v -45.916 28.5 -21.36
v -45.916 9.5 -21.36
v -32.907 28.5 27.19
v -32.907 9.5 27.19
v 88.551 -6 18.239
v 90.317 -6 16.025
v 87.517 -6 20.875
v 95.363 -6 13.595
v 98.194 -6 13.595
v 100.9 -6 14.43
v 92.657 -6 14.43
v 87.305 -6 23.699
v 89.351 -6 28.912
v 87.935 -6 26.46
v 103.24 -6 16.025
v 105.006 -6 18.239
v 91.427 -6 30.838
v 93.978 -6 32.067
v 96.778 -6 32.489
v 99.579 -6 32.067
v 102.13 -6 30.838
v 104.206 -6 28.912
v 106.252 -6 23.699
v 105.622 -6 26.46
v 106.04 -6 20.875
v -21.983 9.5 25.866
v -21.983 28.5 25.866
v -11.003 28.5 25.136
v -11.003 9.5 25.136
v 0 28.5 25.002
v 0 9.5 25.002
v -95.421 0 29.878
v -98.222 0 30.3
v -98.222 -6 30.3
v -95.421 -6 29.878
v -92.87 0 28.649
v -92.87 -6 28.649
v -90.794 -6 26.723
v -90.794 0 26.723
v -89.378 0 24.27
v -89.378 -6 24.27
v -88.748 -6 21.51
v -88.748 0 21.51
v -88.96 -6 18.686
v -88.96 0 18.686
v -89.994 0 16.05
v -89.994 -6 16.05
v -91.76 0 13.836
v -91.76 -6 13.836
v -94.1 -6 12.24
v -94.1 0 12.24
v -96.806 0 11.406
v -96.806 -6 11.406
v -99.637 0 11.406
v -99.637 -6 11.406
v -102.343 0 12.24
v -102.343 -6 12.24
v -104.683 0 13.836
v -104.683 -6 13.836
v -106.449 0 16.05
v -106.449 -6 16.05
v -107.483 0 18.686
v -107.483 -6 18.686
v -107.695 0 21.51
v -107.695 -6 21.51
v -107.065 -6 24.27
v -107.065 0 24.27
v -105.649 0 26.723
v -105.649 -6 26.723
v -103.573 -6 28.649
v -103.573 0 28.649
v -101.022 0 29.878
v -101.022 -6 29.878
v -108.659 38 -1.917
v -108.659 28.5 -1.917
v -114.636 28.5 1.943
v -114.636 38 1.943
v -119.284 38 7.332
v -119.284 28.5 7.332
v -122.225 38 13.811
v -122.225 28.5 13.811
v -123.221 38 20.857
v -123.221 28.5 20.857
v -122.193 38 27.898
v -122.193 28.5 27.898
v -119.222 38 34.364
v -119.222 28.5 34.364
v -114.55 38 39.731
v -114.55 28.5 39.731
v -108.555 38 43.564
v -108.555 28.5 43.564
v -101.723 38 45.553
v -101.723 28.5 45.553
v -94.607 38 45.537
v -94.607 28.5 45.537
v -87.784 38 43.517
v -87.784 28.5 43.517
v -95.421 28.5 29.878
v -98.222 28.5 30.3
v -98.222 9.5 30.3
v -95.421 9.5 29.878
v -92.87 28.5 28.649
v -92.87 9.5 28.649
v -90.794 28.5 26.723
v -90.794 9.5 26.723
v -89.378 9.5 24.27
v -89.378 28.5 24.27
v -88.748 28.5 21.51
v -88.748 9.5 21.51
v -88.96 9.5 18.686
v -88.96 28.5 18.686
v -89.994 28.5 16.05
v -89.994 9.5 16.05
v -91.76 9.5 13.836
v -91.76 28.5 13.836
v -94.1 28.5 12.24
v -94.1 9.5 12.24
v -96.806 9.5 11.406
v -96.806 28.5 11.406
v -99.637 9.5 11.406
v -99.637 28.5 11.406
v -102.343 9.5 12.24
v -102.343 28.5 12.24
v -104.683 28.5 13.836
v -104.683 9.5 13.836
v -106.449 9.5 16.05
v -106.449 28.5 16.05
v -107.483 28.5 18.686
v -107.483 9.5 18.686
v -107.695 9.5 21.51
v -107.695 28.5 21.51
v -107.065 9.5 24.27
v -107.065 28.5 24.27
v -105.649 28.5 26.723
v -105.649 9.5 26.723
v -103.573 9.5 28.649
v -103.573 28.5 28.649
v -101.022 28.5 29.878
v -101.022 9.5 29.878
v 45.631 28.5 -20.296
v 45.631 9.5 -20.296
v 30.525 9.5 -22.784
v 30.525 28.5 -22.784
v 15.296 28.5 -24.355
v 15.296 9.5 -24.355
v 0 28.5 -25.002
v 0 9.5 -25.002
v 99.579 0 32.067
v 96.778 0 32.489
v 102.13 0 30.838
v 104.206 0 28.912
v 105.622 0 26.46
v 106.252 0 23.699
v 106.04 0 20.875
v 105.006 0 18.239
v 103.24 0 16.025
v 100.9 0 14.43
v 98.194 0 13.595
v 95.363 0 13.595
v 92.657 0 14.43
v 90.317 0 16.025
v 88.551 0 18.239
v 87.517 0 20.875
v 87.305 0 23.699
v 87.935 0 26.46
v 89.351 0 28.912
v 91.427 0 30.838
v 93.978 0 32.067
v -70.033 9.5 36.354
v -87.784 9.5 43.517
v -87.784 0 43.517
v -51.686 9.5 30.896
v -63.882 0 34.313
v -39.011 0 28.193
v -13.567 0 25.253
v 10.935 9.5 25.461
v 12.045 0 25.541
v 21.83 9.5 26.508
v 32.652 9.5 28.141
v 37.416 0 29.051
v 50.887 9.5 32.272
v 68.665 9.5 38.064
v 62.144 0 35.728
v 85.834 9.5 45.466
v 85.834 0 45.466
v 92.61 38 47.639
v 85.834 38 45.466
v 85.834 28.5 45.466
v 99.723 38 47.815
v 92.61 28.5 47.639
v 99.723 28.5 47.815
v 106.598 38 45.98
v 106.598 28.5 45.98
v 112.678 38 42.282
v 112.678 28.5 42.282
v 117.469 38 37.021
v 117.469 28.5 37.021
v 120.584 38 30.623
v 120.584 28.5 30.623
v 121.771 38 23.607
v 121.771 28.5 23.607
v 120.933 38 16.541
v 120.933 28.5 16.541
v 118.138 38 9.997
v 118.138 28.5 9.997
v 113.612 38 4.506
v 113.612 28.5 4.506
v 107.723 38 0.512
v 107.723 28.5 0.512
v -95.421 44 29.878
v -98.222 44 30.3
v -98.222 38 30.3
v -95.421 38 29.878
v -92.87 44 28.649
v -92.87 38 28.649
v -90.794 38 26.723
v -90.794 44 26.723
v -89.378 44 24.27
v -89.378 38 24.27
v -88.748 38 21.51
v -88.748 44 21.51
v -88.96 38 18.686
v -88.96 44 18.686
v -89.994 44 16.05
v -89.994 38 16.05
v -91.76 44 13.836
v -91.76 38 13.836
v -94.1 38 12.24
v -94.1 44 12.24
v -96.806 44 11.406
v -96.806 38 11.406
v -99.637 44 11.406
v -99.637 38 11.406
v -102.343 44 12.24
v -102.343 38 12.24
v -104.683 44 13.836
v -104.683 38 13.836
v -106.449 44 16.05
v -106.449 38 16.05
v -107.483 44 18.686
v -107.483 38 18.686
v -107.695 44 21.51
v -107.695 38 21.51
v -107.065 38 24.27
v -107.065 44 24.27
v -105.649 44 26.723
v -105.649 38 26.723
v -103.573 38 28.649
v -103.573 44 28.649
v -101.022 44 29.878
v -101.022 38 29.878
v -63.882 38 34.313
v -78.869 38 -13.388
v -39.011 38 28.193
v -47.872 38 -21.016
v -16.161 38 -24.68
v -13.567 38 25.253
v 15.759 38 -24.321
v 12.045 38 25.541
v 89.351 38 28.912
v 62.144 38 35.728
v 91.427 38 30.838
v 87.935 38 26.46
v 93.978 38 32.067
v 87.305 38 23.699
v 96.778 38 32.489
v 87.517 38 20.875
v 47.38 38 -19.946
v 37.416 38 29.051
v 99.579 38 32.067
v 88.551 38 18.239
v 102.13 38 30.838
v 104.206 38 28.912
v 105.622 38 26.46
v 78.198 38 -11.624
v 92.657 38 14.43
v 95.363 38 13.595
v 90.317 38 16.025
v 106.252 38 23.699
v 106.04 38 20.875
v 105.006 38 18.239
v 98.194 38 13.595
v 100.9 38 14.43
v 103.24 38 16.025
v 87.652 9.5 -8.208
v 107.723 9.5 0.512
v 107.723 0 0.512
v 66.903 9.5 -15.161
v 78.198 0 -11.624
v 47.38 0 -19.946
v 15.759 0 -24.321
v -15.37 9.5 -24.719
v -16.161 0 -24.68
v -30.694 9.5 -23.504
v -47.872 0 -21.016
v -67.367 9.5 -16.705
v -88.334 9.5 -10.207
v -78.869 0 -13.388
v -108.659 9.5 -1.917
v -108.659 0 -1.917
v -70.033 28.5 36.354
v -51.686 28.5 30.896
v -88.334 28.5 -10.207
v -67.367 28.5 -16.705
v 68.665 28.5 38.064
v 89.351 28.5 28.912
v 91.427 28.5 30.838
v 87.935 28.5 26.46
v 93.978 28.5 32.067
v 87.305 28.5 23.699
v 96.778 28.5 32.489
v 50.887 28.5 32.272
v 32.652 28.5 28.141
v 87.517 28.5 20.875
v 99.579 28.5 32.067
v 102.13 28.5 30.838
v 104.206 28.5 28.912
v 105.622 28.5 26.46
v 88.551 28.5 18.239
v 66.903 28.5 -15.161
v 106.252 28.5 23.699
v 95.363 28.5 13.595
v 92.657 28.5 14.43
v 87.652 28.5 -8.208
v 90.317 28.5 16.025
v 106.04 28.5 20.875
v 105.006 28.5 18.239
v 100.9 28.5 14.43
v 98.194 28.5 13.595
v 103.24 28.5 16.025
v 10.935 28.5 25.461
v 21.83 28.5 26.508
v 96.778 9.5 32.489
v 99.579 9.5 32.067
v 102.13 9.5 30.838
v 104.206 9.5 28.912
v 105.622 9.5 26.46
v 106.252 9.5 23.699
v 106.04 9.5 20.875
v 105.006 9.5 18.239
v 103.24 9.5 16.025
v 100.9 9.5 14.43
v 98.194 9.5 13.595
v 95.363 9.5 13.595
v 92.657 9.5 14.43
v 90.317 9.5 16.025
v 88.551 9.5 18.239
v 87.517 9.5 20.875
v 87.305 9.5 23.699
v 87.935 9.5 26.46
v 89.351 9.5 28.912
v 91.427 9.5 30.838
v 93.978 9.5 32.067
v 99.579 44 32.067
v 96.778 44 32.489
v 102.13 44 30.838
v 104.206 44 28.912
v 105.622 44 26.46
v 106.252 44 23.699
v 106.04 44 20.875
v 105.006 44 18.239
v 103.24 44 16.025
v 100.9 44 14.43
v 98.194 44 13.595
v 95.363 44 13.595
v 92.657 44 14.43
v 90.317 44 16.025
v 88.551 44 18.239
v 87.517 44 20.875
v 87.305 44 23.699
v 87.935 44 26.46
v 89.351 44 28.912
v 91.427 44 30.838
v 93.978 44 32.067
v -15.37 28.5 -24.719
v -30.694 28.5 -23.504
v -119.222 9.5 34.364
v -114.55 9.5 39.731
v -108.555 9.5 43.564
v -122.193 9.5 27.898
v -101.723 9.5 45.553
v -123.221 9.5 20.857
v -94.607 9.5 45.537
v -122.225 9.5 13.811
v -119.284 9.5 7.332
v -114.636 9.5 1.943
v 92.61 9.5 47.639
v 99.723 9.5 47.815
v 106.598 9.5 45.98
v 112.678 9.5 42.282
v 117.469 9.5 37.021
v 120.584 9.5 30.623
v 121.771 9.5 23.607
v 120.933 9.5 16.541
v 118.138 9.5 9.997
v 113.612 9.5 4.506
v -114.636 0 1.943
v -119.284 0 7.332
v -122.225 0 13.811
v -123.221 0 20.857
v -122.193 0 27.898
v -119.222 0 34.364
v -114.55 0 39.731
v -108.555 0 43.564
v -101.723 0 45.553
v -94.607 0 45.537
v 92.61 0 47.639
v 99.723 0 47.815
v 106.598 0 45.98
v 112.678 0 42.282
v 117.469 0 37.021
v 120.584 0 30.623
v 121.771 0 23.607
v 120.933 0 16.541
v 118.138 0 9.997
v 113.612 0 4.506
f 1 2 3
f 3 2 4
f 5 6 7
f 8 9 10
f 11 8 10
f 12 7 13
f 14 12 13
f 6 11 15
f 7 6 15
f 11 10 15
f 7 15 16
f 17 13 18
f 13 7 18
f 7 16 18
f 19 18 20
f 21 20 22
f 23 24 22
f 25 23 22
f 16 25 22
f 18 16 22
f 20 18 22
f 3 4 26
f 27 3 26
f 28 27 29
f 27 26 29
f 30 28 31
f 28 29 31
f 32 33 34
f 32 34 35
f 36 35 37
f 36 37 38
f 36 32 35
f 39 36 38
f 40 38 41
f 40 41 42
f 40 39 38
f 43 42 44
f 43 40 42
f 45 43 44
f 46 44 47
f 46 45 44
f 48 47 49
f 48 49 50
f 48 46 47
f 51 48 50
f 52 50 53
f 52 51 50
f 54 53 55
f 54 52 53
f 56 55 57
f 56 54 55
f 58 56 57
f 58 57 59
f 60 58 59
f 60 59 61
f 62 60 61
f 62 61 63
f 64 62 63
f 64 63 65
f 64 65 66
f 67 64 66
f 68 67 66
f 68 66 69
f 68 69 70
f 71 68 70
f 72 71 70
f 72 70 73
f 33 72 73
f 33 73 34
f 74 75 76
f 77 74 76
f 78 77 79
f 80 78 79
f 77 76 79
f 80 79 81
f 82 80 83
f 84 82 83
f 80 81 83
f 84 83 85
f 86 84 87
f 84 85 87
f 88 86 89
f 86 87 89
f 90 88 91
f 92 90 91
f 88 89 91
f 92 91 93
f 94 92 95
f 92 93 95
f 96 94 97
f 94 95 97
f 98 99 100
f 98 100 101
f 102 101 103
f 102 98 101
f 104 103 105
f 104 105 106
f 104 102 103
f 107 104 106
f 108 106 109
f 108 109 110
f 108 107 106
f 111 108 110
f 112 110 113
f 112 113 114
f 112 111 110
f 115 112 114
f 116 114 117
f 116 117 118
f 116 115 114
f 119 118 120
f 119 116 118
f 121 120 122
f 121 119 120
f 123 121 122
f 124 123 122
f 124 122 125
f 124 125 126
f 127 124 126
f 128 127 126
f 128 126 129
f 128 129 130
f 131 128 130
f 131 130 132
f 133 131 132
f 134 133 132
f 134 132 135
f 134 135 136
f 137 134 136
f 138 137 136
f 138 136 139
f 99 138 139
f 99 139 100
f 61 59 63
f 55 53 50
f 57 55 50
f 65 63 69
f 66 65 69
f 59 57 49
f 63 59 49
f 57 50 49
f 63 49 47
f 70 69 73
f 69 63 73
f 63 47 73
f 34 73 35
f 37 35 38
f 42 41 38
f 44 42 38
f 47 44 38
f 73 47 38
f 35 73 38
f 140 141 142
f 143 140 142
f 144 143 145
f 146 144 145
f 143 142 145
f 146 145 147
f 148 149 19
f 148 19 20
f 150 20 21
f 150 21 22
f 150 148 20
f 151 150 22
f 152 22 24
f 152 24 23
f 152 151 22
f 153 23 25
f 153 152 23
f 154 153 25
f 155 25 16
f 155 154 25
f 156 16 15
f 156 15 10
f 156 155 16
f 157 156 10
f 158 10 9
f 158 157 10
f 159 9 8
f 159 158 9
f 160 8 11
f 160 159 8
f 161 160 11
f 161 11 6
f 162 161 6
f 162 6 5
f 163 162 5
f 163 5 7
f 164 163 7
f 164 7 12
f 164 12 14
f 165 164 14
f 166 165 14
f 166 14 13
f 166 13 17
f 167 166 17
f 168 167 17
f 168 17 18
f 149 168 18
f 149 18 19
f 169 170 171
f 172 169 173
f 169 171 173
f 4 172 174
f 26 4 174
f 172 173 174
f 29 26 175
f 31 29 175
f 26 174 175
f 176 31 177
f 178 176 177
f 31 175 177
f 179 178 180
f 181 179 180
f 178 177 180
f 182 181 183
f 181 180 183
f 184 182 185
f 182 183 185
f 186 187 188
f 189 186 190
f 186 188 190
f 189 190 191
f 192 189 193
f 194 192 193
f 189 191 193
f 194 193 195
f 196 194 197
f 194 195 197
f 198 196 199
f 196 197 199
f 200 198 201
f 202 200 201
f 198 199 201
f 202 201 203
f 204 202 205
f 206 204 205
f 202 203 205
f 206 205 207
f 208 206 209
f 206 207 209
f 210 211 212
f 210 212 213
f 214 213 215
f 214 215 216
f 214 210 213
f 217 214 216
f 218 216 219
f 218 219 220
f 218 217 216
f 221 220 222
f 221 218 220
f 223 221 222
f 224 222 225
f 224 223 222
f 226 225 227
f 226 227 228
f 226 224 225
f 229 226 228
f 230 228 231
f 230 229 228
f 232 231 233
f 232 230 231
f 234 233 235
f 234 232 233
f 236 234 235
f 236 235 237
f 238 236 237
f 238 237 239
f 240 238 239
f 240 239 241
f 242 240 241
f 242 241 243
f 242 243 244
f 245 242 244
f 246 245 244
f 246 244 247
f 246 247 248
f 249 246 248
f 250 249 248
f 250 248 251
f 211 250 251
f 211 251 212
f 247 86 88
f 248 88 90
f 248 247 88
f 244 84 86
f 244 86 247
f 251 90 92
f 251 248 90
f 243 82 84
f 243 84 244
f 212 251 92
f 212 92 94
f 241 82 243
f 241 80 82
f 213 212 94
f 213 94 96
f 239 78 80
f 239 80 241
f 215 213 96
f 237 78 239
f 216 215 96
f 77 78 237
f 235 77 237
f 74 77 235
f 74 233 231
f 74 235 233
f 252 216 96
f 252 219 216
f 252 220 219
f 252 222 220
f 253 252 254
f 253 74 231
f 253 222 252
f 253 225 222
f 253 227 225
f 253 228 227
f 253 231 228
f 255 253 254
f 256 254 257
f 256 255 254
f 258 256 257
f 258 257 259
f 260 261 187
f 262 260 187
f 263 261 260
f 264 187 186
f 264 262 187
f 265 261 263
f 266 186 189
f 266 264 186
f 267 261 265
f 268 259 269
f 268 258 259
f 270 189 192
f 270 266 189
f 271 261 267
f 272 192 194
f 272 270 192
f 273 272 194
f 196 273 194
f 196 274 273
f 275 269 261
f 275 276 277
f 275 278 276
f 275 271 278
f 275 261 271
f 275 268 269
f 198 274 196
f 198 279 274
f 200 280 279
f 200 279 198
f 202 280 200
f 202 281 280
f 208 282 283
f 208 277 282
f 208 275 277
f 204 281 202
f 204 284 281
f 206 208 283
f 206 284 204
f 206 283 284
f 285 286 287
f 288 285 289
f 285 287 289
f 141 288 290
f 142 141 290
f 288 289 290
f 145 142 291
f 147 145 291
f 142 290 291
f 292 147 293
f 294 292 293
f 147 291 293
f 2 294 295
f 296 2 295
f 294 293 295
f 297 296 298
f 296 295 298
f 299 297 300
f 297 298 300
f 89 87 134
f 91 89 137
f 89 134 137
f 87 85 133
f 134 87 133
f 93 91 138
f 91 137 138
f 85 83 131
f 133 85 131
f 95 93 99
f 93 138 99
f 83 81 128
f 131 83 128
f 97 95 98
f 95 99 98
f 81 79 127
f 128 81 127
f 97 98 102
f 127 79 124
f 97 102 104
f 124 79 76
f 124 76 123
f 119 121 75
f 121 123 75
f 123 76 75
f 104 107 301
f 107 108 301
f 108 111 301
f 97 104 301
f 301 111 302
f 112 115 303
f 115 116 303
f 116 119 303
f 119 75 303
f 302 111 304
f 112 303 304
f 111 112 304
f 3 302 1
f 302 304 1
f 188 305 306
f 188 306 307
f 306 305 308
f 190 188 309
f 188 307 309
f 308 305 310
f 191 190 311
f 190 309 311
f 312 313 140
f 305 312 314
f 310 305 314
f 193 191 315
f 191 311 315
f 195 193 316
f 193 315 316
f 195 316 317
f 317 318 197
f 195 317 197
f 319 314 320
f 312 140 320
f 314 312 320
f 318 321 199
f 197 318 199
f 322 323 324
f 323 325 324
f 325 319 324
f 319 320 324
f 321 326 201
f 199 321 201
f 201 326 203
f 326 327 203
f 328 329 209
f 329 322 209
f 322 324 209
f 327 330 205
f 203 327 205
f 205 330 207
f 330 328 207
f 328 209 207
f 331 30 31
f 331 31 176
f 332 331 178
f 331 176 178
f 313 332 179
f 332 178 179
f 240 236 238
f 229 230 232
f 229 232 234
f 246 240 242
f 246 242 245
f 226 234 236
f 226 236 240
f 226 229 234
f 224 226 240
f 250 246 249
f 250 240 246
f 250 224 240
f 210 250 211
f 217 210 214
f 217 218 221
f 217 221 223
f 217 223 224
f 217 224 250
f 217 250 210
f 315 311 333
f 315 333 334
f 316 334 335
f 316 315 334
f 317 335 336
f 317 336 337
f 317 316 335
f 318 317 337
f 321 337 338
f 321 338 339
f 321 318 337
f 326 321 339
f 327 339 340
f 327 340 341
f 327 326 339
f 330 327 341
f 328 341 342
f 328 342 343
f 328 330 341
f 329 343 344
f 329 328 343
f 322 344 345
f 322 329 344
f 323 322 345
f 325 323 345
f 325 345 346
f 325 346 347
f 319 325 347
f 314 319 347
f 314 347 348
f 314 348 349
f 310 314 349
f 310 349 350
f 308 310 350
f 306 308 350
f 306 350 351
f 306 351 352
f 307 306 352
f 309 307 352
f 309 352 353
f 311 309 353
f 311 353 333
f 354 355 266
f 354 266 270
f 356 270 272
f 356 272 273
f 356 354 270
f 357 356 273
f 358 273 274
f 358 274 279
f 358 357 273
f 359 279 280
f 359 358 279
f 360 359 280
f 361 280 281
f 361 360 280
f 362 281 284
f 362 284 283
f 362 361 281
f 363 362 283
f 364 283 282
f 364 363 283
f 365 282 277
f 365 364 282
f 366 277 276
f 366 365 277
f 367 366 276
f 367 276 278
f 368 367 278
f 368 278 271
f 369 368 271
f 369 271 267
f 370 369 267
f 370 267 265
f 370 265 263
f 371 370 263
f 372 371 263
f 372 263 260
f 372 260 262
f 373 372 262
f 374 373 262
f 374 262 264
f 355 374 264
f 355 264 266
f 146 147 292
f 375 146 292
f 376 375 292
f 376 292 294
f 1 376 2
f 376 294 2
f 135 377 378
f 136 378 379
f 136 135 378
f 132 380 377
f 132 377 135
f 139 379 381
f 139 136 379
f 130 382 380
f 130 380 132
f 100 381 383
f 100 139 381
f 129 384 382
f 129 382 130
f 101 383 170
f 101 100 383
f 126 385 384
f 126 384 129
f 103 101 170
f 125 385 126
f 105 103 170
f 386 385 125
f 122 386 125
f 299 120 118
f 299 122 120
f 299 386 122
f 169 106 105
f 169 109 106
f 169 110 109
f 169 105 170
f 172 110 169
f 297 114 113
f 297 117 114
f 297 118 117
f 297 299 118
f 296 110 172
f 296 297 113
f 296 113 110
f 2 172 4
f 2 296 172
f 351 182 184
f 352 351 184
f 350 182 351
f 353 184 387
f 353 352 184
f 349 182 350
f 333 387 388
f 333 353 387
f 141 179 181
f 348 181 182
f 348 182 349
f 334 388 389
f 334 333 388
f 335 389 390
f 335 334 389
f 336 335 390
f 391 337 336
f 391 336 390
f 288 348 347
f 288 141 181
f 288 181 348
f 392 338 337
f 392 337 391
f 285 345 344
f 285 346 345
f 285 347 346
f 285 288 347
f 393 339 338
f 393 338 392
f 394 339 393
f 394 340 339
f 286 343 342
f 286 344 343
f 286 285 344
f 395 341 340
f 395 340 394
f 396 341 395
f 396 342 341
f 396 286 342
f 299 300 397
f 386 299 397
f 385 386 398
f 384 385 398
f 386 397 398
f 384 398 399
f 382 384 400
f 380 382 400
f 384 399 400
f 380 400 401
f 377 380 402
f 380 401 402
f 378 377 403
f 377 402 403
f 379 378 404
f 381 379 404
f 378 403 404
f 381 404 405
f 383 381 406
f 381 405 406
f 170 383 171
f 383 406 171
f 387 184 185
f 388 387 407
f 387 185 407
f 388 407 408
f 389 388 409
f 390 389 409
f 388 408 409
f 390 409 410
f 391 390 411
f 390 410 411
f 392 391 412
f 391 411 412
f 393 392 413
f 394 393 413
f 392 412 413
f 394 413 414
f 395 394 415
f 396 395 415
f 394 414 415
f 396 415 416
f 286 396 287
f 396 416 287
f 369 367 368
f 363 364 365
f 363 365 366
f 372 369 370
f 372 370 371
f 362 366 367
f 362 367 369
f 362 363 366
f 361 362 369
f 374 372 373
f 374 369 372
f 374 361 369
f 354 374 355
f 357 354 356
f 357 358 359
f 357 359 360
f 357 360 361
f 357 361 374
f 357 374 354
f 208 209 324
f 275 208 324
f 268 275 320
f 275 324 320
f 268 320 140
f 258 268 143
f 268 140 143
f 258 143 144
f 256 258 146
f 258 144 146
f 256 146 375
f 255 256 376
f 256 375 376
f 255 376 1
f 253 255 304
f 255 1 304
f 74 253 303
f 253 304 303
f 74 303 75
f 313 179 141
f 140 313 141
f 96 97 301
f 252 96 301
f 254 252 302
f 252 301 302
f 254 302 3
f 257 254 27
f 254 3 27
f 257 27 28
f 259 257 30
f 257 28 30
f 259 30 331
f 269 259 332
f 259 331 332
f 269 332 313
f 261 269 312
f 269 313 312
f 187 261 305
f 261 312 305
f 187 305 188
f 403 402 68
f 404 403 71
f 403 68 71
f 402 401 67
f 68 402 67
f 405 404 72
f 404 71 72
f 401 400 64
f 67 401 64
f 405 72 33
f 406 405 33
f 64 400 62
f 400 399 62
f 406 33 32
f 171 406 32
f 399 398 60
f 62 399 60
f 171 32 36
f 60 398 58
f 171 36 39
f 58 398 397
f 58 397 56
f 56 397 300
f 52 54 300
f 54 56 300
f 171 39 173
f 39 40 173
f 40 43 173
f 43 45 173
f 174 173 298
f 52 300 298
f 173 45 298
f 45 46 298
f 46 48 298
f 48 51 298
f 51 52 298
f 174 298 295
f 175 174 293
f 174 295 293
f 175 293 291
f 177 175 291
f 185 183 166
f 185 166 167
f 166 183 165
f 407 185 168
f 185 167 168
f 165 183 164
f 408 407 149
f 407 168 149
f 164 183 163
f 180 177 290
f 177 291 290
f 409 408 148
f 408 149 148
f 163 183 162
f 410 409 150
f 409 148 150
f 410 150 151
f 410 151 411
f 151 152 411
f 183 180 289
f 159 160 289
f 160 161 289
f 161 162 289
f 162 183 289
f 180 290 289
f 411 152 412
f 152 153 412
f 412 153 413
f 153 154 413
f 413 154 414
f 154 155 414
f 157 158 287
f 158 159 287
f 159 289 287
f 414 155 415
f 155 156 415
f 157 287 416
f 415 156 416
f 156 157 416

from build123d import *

# Parameters (mm, degrees)
BOSS_EXTRUDE1_DEPTH = 9.5
BOSS_EXTRUDE2_DEPTH = 19
BOSS_EXTRUDE3_DEPTH = 9.5
SKETCH4_R           = 9.5
CUT_EXTRUDE1_DEPTH  = 138.588150993
BOSS_EXTRUDE4_START = 6
SKETCH4_2_R         = 9.5
BOSS_EXTRUDE4_DEPTH = 50


with BuildPart() as part:
    # Sketch1 → Boss-Extrude1 (new body)
    with BuildSketch(Plane(origin=(0, 0, 0), x_dir=(1, 0, 0), z_dir=(0, 1, 0))):
        with BuildLine():
            ThreePointArc((107.722957073, -0.512015135), (-0.194984925, 25.004261154), (-108.658621874, 1.917424631))
            ThreePointArc((-108.658621874, 1.917424631), (-120.938659261, -31.236770908), (-87.784463723, -43.516808294))
            ThreePointArc((-87.784463723, -43.516808294), (-0.756328147, -24.992587685), (85.83395733, -45.466121624))
            ThreePointArc((85.83395733, -45.466121624), (119.255510446, -33.933568251), (107.722957073, -0.512015135))
        make_face()
    extrude(amount=BOSS_EXTRUDE1_DEPTH)

    # Sketch2 → Boss-Extrude2 (add)
    with BuildSketch(Plane(origin=(0, 9.5, 0), x_dir=(1, 0, 0), z_dir=(0, 1, 0))):
        with BuildLine():
            ThreePointArc((-32.906939519, -27.189629795), (-0.088825925, -25.001179802), (32.651934744, -28.141320571))
            Line((32.651934744, -28.141320571), (45.630544935, 20.295512075))
            ThreePointArc((45.630544935, 20.295512075), (-0.094052921, 25.003107796), (-45.915742347, 21.359883308))
            Line((-45.915742347, 21.359883308), (-32.906939519, -27.189629795))
        make_face()
    extrude(amount=BOSS_EXTRUDE2_DEPTH)

    # Sketch3 → Boss-Extrude3 (add)
    with BuildSketch(Plane(origin=(0, 28.5, 0), x_dir=(1, 0, 0), z_dir=(0, 1, 0))):
        with BuildLine():
            ThreePointArc((107.722957073, -0.512015135), (-0.194984925, 25.004261154), (-108.658621874, 1.917424631))
            ThreePointArc((-108.658621874, 1.917424631), (-120.938659261, -31.236770908), (-87.784463723, -43.516808294))
            ThreePointArc((-87.784463723, -43.516808294), (-0.756328147, -24.992587685), (85.83395733, -45.466121624))
            ThreePointArc((85.83395733, -45.466121624), (119.255510446, -33.933568251), (107.722957073, -0.512015135))
        make_face()
    extrude(amount=BOSS_EXTRUDE3_DEPTH)

    # Sketch4 → Cut-Extrude1 (cut, through all)
    with BuildSketch(Plane(origin=(0, 38, 0), x_dir=(1, 0, 0), z_dir=(0, 1, 0))):
        with Locations((-98.221542799, -20.799691832)):
            Circle(SKETCH4_R)
        with Locations((96.778457201, -22.989068379)):
            Circle(SKETCH4_R)
    extrude(amount=-CUT_EXTRUDE1_DEPTH, mode=Mode.SUBTRACT)

    # Sketch4<2> → Boss-Extrude4 (add)
    with BuildSketch(Plane(origin=(0, 38, 0), x_dir=(1, 0, 0), z_dir=(0, 1, 0)).offset(BOSS_EXTRUDE4_START)):
        with Locations((-98.221542799, -20.799691832)):
            Circle(SKETCH4_2_R)
        with Locations((96.778457201, -22.989068379)):
            Circle(SKETCH4_2_R)
    extrude(amount=-BOSS_EXTRUDE4_DEPTH)


solid = part.part
